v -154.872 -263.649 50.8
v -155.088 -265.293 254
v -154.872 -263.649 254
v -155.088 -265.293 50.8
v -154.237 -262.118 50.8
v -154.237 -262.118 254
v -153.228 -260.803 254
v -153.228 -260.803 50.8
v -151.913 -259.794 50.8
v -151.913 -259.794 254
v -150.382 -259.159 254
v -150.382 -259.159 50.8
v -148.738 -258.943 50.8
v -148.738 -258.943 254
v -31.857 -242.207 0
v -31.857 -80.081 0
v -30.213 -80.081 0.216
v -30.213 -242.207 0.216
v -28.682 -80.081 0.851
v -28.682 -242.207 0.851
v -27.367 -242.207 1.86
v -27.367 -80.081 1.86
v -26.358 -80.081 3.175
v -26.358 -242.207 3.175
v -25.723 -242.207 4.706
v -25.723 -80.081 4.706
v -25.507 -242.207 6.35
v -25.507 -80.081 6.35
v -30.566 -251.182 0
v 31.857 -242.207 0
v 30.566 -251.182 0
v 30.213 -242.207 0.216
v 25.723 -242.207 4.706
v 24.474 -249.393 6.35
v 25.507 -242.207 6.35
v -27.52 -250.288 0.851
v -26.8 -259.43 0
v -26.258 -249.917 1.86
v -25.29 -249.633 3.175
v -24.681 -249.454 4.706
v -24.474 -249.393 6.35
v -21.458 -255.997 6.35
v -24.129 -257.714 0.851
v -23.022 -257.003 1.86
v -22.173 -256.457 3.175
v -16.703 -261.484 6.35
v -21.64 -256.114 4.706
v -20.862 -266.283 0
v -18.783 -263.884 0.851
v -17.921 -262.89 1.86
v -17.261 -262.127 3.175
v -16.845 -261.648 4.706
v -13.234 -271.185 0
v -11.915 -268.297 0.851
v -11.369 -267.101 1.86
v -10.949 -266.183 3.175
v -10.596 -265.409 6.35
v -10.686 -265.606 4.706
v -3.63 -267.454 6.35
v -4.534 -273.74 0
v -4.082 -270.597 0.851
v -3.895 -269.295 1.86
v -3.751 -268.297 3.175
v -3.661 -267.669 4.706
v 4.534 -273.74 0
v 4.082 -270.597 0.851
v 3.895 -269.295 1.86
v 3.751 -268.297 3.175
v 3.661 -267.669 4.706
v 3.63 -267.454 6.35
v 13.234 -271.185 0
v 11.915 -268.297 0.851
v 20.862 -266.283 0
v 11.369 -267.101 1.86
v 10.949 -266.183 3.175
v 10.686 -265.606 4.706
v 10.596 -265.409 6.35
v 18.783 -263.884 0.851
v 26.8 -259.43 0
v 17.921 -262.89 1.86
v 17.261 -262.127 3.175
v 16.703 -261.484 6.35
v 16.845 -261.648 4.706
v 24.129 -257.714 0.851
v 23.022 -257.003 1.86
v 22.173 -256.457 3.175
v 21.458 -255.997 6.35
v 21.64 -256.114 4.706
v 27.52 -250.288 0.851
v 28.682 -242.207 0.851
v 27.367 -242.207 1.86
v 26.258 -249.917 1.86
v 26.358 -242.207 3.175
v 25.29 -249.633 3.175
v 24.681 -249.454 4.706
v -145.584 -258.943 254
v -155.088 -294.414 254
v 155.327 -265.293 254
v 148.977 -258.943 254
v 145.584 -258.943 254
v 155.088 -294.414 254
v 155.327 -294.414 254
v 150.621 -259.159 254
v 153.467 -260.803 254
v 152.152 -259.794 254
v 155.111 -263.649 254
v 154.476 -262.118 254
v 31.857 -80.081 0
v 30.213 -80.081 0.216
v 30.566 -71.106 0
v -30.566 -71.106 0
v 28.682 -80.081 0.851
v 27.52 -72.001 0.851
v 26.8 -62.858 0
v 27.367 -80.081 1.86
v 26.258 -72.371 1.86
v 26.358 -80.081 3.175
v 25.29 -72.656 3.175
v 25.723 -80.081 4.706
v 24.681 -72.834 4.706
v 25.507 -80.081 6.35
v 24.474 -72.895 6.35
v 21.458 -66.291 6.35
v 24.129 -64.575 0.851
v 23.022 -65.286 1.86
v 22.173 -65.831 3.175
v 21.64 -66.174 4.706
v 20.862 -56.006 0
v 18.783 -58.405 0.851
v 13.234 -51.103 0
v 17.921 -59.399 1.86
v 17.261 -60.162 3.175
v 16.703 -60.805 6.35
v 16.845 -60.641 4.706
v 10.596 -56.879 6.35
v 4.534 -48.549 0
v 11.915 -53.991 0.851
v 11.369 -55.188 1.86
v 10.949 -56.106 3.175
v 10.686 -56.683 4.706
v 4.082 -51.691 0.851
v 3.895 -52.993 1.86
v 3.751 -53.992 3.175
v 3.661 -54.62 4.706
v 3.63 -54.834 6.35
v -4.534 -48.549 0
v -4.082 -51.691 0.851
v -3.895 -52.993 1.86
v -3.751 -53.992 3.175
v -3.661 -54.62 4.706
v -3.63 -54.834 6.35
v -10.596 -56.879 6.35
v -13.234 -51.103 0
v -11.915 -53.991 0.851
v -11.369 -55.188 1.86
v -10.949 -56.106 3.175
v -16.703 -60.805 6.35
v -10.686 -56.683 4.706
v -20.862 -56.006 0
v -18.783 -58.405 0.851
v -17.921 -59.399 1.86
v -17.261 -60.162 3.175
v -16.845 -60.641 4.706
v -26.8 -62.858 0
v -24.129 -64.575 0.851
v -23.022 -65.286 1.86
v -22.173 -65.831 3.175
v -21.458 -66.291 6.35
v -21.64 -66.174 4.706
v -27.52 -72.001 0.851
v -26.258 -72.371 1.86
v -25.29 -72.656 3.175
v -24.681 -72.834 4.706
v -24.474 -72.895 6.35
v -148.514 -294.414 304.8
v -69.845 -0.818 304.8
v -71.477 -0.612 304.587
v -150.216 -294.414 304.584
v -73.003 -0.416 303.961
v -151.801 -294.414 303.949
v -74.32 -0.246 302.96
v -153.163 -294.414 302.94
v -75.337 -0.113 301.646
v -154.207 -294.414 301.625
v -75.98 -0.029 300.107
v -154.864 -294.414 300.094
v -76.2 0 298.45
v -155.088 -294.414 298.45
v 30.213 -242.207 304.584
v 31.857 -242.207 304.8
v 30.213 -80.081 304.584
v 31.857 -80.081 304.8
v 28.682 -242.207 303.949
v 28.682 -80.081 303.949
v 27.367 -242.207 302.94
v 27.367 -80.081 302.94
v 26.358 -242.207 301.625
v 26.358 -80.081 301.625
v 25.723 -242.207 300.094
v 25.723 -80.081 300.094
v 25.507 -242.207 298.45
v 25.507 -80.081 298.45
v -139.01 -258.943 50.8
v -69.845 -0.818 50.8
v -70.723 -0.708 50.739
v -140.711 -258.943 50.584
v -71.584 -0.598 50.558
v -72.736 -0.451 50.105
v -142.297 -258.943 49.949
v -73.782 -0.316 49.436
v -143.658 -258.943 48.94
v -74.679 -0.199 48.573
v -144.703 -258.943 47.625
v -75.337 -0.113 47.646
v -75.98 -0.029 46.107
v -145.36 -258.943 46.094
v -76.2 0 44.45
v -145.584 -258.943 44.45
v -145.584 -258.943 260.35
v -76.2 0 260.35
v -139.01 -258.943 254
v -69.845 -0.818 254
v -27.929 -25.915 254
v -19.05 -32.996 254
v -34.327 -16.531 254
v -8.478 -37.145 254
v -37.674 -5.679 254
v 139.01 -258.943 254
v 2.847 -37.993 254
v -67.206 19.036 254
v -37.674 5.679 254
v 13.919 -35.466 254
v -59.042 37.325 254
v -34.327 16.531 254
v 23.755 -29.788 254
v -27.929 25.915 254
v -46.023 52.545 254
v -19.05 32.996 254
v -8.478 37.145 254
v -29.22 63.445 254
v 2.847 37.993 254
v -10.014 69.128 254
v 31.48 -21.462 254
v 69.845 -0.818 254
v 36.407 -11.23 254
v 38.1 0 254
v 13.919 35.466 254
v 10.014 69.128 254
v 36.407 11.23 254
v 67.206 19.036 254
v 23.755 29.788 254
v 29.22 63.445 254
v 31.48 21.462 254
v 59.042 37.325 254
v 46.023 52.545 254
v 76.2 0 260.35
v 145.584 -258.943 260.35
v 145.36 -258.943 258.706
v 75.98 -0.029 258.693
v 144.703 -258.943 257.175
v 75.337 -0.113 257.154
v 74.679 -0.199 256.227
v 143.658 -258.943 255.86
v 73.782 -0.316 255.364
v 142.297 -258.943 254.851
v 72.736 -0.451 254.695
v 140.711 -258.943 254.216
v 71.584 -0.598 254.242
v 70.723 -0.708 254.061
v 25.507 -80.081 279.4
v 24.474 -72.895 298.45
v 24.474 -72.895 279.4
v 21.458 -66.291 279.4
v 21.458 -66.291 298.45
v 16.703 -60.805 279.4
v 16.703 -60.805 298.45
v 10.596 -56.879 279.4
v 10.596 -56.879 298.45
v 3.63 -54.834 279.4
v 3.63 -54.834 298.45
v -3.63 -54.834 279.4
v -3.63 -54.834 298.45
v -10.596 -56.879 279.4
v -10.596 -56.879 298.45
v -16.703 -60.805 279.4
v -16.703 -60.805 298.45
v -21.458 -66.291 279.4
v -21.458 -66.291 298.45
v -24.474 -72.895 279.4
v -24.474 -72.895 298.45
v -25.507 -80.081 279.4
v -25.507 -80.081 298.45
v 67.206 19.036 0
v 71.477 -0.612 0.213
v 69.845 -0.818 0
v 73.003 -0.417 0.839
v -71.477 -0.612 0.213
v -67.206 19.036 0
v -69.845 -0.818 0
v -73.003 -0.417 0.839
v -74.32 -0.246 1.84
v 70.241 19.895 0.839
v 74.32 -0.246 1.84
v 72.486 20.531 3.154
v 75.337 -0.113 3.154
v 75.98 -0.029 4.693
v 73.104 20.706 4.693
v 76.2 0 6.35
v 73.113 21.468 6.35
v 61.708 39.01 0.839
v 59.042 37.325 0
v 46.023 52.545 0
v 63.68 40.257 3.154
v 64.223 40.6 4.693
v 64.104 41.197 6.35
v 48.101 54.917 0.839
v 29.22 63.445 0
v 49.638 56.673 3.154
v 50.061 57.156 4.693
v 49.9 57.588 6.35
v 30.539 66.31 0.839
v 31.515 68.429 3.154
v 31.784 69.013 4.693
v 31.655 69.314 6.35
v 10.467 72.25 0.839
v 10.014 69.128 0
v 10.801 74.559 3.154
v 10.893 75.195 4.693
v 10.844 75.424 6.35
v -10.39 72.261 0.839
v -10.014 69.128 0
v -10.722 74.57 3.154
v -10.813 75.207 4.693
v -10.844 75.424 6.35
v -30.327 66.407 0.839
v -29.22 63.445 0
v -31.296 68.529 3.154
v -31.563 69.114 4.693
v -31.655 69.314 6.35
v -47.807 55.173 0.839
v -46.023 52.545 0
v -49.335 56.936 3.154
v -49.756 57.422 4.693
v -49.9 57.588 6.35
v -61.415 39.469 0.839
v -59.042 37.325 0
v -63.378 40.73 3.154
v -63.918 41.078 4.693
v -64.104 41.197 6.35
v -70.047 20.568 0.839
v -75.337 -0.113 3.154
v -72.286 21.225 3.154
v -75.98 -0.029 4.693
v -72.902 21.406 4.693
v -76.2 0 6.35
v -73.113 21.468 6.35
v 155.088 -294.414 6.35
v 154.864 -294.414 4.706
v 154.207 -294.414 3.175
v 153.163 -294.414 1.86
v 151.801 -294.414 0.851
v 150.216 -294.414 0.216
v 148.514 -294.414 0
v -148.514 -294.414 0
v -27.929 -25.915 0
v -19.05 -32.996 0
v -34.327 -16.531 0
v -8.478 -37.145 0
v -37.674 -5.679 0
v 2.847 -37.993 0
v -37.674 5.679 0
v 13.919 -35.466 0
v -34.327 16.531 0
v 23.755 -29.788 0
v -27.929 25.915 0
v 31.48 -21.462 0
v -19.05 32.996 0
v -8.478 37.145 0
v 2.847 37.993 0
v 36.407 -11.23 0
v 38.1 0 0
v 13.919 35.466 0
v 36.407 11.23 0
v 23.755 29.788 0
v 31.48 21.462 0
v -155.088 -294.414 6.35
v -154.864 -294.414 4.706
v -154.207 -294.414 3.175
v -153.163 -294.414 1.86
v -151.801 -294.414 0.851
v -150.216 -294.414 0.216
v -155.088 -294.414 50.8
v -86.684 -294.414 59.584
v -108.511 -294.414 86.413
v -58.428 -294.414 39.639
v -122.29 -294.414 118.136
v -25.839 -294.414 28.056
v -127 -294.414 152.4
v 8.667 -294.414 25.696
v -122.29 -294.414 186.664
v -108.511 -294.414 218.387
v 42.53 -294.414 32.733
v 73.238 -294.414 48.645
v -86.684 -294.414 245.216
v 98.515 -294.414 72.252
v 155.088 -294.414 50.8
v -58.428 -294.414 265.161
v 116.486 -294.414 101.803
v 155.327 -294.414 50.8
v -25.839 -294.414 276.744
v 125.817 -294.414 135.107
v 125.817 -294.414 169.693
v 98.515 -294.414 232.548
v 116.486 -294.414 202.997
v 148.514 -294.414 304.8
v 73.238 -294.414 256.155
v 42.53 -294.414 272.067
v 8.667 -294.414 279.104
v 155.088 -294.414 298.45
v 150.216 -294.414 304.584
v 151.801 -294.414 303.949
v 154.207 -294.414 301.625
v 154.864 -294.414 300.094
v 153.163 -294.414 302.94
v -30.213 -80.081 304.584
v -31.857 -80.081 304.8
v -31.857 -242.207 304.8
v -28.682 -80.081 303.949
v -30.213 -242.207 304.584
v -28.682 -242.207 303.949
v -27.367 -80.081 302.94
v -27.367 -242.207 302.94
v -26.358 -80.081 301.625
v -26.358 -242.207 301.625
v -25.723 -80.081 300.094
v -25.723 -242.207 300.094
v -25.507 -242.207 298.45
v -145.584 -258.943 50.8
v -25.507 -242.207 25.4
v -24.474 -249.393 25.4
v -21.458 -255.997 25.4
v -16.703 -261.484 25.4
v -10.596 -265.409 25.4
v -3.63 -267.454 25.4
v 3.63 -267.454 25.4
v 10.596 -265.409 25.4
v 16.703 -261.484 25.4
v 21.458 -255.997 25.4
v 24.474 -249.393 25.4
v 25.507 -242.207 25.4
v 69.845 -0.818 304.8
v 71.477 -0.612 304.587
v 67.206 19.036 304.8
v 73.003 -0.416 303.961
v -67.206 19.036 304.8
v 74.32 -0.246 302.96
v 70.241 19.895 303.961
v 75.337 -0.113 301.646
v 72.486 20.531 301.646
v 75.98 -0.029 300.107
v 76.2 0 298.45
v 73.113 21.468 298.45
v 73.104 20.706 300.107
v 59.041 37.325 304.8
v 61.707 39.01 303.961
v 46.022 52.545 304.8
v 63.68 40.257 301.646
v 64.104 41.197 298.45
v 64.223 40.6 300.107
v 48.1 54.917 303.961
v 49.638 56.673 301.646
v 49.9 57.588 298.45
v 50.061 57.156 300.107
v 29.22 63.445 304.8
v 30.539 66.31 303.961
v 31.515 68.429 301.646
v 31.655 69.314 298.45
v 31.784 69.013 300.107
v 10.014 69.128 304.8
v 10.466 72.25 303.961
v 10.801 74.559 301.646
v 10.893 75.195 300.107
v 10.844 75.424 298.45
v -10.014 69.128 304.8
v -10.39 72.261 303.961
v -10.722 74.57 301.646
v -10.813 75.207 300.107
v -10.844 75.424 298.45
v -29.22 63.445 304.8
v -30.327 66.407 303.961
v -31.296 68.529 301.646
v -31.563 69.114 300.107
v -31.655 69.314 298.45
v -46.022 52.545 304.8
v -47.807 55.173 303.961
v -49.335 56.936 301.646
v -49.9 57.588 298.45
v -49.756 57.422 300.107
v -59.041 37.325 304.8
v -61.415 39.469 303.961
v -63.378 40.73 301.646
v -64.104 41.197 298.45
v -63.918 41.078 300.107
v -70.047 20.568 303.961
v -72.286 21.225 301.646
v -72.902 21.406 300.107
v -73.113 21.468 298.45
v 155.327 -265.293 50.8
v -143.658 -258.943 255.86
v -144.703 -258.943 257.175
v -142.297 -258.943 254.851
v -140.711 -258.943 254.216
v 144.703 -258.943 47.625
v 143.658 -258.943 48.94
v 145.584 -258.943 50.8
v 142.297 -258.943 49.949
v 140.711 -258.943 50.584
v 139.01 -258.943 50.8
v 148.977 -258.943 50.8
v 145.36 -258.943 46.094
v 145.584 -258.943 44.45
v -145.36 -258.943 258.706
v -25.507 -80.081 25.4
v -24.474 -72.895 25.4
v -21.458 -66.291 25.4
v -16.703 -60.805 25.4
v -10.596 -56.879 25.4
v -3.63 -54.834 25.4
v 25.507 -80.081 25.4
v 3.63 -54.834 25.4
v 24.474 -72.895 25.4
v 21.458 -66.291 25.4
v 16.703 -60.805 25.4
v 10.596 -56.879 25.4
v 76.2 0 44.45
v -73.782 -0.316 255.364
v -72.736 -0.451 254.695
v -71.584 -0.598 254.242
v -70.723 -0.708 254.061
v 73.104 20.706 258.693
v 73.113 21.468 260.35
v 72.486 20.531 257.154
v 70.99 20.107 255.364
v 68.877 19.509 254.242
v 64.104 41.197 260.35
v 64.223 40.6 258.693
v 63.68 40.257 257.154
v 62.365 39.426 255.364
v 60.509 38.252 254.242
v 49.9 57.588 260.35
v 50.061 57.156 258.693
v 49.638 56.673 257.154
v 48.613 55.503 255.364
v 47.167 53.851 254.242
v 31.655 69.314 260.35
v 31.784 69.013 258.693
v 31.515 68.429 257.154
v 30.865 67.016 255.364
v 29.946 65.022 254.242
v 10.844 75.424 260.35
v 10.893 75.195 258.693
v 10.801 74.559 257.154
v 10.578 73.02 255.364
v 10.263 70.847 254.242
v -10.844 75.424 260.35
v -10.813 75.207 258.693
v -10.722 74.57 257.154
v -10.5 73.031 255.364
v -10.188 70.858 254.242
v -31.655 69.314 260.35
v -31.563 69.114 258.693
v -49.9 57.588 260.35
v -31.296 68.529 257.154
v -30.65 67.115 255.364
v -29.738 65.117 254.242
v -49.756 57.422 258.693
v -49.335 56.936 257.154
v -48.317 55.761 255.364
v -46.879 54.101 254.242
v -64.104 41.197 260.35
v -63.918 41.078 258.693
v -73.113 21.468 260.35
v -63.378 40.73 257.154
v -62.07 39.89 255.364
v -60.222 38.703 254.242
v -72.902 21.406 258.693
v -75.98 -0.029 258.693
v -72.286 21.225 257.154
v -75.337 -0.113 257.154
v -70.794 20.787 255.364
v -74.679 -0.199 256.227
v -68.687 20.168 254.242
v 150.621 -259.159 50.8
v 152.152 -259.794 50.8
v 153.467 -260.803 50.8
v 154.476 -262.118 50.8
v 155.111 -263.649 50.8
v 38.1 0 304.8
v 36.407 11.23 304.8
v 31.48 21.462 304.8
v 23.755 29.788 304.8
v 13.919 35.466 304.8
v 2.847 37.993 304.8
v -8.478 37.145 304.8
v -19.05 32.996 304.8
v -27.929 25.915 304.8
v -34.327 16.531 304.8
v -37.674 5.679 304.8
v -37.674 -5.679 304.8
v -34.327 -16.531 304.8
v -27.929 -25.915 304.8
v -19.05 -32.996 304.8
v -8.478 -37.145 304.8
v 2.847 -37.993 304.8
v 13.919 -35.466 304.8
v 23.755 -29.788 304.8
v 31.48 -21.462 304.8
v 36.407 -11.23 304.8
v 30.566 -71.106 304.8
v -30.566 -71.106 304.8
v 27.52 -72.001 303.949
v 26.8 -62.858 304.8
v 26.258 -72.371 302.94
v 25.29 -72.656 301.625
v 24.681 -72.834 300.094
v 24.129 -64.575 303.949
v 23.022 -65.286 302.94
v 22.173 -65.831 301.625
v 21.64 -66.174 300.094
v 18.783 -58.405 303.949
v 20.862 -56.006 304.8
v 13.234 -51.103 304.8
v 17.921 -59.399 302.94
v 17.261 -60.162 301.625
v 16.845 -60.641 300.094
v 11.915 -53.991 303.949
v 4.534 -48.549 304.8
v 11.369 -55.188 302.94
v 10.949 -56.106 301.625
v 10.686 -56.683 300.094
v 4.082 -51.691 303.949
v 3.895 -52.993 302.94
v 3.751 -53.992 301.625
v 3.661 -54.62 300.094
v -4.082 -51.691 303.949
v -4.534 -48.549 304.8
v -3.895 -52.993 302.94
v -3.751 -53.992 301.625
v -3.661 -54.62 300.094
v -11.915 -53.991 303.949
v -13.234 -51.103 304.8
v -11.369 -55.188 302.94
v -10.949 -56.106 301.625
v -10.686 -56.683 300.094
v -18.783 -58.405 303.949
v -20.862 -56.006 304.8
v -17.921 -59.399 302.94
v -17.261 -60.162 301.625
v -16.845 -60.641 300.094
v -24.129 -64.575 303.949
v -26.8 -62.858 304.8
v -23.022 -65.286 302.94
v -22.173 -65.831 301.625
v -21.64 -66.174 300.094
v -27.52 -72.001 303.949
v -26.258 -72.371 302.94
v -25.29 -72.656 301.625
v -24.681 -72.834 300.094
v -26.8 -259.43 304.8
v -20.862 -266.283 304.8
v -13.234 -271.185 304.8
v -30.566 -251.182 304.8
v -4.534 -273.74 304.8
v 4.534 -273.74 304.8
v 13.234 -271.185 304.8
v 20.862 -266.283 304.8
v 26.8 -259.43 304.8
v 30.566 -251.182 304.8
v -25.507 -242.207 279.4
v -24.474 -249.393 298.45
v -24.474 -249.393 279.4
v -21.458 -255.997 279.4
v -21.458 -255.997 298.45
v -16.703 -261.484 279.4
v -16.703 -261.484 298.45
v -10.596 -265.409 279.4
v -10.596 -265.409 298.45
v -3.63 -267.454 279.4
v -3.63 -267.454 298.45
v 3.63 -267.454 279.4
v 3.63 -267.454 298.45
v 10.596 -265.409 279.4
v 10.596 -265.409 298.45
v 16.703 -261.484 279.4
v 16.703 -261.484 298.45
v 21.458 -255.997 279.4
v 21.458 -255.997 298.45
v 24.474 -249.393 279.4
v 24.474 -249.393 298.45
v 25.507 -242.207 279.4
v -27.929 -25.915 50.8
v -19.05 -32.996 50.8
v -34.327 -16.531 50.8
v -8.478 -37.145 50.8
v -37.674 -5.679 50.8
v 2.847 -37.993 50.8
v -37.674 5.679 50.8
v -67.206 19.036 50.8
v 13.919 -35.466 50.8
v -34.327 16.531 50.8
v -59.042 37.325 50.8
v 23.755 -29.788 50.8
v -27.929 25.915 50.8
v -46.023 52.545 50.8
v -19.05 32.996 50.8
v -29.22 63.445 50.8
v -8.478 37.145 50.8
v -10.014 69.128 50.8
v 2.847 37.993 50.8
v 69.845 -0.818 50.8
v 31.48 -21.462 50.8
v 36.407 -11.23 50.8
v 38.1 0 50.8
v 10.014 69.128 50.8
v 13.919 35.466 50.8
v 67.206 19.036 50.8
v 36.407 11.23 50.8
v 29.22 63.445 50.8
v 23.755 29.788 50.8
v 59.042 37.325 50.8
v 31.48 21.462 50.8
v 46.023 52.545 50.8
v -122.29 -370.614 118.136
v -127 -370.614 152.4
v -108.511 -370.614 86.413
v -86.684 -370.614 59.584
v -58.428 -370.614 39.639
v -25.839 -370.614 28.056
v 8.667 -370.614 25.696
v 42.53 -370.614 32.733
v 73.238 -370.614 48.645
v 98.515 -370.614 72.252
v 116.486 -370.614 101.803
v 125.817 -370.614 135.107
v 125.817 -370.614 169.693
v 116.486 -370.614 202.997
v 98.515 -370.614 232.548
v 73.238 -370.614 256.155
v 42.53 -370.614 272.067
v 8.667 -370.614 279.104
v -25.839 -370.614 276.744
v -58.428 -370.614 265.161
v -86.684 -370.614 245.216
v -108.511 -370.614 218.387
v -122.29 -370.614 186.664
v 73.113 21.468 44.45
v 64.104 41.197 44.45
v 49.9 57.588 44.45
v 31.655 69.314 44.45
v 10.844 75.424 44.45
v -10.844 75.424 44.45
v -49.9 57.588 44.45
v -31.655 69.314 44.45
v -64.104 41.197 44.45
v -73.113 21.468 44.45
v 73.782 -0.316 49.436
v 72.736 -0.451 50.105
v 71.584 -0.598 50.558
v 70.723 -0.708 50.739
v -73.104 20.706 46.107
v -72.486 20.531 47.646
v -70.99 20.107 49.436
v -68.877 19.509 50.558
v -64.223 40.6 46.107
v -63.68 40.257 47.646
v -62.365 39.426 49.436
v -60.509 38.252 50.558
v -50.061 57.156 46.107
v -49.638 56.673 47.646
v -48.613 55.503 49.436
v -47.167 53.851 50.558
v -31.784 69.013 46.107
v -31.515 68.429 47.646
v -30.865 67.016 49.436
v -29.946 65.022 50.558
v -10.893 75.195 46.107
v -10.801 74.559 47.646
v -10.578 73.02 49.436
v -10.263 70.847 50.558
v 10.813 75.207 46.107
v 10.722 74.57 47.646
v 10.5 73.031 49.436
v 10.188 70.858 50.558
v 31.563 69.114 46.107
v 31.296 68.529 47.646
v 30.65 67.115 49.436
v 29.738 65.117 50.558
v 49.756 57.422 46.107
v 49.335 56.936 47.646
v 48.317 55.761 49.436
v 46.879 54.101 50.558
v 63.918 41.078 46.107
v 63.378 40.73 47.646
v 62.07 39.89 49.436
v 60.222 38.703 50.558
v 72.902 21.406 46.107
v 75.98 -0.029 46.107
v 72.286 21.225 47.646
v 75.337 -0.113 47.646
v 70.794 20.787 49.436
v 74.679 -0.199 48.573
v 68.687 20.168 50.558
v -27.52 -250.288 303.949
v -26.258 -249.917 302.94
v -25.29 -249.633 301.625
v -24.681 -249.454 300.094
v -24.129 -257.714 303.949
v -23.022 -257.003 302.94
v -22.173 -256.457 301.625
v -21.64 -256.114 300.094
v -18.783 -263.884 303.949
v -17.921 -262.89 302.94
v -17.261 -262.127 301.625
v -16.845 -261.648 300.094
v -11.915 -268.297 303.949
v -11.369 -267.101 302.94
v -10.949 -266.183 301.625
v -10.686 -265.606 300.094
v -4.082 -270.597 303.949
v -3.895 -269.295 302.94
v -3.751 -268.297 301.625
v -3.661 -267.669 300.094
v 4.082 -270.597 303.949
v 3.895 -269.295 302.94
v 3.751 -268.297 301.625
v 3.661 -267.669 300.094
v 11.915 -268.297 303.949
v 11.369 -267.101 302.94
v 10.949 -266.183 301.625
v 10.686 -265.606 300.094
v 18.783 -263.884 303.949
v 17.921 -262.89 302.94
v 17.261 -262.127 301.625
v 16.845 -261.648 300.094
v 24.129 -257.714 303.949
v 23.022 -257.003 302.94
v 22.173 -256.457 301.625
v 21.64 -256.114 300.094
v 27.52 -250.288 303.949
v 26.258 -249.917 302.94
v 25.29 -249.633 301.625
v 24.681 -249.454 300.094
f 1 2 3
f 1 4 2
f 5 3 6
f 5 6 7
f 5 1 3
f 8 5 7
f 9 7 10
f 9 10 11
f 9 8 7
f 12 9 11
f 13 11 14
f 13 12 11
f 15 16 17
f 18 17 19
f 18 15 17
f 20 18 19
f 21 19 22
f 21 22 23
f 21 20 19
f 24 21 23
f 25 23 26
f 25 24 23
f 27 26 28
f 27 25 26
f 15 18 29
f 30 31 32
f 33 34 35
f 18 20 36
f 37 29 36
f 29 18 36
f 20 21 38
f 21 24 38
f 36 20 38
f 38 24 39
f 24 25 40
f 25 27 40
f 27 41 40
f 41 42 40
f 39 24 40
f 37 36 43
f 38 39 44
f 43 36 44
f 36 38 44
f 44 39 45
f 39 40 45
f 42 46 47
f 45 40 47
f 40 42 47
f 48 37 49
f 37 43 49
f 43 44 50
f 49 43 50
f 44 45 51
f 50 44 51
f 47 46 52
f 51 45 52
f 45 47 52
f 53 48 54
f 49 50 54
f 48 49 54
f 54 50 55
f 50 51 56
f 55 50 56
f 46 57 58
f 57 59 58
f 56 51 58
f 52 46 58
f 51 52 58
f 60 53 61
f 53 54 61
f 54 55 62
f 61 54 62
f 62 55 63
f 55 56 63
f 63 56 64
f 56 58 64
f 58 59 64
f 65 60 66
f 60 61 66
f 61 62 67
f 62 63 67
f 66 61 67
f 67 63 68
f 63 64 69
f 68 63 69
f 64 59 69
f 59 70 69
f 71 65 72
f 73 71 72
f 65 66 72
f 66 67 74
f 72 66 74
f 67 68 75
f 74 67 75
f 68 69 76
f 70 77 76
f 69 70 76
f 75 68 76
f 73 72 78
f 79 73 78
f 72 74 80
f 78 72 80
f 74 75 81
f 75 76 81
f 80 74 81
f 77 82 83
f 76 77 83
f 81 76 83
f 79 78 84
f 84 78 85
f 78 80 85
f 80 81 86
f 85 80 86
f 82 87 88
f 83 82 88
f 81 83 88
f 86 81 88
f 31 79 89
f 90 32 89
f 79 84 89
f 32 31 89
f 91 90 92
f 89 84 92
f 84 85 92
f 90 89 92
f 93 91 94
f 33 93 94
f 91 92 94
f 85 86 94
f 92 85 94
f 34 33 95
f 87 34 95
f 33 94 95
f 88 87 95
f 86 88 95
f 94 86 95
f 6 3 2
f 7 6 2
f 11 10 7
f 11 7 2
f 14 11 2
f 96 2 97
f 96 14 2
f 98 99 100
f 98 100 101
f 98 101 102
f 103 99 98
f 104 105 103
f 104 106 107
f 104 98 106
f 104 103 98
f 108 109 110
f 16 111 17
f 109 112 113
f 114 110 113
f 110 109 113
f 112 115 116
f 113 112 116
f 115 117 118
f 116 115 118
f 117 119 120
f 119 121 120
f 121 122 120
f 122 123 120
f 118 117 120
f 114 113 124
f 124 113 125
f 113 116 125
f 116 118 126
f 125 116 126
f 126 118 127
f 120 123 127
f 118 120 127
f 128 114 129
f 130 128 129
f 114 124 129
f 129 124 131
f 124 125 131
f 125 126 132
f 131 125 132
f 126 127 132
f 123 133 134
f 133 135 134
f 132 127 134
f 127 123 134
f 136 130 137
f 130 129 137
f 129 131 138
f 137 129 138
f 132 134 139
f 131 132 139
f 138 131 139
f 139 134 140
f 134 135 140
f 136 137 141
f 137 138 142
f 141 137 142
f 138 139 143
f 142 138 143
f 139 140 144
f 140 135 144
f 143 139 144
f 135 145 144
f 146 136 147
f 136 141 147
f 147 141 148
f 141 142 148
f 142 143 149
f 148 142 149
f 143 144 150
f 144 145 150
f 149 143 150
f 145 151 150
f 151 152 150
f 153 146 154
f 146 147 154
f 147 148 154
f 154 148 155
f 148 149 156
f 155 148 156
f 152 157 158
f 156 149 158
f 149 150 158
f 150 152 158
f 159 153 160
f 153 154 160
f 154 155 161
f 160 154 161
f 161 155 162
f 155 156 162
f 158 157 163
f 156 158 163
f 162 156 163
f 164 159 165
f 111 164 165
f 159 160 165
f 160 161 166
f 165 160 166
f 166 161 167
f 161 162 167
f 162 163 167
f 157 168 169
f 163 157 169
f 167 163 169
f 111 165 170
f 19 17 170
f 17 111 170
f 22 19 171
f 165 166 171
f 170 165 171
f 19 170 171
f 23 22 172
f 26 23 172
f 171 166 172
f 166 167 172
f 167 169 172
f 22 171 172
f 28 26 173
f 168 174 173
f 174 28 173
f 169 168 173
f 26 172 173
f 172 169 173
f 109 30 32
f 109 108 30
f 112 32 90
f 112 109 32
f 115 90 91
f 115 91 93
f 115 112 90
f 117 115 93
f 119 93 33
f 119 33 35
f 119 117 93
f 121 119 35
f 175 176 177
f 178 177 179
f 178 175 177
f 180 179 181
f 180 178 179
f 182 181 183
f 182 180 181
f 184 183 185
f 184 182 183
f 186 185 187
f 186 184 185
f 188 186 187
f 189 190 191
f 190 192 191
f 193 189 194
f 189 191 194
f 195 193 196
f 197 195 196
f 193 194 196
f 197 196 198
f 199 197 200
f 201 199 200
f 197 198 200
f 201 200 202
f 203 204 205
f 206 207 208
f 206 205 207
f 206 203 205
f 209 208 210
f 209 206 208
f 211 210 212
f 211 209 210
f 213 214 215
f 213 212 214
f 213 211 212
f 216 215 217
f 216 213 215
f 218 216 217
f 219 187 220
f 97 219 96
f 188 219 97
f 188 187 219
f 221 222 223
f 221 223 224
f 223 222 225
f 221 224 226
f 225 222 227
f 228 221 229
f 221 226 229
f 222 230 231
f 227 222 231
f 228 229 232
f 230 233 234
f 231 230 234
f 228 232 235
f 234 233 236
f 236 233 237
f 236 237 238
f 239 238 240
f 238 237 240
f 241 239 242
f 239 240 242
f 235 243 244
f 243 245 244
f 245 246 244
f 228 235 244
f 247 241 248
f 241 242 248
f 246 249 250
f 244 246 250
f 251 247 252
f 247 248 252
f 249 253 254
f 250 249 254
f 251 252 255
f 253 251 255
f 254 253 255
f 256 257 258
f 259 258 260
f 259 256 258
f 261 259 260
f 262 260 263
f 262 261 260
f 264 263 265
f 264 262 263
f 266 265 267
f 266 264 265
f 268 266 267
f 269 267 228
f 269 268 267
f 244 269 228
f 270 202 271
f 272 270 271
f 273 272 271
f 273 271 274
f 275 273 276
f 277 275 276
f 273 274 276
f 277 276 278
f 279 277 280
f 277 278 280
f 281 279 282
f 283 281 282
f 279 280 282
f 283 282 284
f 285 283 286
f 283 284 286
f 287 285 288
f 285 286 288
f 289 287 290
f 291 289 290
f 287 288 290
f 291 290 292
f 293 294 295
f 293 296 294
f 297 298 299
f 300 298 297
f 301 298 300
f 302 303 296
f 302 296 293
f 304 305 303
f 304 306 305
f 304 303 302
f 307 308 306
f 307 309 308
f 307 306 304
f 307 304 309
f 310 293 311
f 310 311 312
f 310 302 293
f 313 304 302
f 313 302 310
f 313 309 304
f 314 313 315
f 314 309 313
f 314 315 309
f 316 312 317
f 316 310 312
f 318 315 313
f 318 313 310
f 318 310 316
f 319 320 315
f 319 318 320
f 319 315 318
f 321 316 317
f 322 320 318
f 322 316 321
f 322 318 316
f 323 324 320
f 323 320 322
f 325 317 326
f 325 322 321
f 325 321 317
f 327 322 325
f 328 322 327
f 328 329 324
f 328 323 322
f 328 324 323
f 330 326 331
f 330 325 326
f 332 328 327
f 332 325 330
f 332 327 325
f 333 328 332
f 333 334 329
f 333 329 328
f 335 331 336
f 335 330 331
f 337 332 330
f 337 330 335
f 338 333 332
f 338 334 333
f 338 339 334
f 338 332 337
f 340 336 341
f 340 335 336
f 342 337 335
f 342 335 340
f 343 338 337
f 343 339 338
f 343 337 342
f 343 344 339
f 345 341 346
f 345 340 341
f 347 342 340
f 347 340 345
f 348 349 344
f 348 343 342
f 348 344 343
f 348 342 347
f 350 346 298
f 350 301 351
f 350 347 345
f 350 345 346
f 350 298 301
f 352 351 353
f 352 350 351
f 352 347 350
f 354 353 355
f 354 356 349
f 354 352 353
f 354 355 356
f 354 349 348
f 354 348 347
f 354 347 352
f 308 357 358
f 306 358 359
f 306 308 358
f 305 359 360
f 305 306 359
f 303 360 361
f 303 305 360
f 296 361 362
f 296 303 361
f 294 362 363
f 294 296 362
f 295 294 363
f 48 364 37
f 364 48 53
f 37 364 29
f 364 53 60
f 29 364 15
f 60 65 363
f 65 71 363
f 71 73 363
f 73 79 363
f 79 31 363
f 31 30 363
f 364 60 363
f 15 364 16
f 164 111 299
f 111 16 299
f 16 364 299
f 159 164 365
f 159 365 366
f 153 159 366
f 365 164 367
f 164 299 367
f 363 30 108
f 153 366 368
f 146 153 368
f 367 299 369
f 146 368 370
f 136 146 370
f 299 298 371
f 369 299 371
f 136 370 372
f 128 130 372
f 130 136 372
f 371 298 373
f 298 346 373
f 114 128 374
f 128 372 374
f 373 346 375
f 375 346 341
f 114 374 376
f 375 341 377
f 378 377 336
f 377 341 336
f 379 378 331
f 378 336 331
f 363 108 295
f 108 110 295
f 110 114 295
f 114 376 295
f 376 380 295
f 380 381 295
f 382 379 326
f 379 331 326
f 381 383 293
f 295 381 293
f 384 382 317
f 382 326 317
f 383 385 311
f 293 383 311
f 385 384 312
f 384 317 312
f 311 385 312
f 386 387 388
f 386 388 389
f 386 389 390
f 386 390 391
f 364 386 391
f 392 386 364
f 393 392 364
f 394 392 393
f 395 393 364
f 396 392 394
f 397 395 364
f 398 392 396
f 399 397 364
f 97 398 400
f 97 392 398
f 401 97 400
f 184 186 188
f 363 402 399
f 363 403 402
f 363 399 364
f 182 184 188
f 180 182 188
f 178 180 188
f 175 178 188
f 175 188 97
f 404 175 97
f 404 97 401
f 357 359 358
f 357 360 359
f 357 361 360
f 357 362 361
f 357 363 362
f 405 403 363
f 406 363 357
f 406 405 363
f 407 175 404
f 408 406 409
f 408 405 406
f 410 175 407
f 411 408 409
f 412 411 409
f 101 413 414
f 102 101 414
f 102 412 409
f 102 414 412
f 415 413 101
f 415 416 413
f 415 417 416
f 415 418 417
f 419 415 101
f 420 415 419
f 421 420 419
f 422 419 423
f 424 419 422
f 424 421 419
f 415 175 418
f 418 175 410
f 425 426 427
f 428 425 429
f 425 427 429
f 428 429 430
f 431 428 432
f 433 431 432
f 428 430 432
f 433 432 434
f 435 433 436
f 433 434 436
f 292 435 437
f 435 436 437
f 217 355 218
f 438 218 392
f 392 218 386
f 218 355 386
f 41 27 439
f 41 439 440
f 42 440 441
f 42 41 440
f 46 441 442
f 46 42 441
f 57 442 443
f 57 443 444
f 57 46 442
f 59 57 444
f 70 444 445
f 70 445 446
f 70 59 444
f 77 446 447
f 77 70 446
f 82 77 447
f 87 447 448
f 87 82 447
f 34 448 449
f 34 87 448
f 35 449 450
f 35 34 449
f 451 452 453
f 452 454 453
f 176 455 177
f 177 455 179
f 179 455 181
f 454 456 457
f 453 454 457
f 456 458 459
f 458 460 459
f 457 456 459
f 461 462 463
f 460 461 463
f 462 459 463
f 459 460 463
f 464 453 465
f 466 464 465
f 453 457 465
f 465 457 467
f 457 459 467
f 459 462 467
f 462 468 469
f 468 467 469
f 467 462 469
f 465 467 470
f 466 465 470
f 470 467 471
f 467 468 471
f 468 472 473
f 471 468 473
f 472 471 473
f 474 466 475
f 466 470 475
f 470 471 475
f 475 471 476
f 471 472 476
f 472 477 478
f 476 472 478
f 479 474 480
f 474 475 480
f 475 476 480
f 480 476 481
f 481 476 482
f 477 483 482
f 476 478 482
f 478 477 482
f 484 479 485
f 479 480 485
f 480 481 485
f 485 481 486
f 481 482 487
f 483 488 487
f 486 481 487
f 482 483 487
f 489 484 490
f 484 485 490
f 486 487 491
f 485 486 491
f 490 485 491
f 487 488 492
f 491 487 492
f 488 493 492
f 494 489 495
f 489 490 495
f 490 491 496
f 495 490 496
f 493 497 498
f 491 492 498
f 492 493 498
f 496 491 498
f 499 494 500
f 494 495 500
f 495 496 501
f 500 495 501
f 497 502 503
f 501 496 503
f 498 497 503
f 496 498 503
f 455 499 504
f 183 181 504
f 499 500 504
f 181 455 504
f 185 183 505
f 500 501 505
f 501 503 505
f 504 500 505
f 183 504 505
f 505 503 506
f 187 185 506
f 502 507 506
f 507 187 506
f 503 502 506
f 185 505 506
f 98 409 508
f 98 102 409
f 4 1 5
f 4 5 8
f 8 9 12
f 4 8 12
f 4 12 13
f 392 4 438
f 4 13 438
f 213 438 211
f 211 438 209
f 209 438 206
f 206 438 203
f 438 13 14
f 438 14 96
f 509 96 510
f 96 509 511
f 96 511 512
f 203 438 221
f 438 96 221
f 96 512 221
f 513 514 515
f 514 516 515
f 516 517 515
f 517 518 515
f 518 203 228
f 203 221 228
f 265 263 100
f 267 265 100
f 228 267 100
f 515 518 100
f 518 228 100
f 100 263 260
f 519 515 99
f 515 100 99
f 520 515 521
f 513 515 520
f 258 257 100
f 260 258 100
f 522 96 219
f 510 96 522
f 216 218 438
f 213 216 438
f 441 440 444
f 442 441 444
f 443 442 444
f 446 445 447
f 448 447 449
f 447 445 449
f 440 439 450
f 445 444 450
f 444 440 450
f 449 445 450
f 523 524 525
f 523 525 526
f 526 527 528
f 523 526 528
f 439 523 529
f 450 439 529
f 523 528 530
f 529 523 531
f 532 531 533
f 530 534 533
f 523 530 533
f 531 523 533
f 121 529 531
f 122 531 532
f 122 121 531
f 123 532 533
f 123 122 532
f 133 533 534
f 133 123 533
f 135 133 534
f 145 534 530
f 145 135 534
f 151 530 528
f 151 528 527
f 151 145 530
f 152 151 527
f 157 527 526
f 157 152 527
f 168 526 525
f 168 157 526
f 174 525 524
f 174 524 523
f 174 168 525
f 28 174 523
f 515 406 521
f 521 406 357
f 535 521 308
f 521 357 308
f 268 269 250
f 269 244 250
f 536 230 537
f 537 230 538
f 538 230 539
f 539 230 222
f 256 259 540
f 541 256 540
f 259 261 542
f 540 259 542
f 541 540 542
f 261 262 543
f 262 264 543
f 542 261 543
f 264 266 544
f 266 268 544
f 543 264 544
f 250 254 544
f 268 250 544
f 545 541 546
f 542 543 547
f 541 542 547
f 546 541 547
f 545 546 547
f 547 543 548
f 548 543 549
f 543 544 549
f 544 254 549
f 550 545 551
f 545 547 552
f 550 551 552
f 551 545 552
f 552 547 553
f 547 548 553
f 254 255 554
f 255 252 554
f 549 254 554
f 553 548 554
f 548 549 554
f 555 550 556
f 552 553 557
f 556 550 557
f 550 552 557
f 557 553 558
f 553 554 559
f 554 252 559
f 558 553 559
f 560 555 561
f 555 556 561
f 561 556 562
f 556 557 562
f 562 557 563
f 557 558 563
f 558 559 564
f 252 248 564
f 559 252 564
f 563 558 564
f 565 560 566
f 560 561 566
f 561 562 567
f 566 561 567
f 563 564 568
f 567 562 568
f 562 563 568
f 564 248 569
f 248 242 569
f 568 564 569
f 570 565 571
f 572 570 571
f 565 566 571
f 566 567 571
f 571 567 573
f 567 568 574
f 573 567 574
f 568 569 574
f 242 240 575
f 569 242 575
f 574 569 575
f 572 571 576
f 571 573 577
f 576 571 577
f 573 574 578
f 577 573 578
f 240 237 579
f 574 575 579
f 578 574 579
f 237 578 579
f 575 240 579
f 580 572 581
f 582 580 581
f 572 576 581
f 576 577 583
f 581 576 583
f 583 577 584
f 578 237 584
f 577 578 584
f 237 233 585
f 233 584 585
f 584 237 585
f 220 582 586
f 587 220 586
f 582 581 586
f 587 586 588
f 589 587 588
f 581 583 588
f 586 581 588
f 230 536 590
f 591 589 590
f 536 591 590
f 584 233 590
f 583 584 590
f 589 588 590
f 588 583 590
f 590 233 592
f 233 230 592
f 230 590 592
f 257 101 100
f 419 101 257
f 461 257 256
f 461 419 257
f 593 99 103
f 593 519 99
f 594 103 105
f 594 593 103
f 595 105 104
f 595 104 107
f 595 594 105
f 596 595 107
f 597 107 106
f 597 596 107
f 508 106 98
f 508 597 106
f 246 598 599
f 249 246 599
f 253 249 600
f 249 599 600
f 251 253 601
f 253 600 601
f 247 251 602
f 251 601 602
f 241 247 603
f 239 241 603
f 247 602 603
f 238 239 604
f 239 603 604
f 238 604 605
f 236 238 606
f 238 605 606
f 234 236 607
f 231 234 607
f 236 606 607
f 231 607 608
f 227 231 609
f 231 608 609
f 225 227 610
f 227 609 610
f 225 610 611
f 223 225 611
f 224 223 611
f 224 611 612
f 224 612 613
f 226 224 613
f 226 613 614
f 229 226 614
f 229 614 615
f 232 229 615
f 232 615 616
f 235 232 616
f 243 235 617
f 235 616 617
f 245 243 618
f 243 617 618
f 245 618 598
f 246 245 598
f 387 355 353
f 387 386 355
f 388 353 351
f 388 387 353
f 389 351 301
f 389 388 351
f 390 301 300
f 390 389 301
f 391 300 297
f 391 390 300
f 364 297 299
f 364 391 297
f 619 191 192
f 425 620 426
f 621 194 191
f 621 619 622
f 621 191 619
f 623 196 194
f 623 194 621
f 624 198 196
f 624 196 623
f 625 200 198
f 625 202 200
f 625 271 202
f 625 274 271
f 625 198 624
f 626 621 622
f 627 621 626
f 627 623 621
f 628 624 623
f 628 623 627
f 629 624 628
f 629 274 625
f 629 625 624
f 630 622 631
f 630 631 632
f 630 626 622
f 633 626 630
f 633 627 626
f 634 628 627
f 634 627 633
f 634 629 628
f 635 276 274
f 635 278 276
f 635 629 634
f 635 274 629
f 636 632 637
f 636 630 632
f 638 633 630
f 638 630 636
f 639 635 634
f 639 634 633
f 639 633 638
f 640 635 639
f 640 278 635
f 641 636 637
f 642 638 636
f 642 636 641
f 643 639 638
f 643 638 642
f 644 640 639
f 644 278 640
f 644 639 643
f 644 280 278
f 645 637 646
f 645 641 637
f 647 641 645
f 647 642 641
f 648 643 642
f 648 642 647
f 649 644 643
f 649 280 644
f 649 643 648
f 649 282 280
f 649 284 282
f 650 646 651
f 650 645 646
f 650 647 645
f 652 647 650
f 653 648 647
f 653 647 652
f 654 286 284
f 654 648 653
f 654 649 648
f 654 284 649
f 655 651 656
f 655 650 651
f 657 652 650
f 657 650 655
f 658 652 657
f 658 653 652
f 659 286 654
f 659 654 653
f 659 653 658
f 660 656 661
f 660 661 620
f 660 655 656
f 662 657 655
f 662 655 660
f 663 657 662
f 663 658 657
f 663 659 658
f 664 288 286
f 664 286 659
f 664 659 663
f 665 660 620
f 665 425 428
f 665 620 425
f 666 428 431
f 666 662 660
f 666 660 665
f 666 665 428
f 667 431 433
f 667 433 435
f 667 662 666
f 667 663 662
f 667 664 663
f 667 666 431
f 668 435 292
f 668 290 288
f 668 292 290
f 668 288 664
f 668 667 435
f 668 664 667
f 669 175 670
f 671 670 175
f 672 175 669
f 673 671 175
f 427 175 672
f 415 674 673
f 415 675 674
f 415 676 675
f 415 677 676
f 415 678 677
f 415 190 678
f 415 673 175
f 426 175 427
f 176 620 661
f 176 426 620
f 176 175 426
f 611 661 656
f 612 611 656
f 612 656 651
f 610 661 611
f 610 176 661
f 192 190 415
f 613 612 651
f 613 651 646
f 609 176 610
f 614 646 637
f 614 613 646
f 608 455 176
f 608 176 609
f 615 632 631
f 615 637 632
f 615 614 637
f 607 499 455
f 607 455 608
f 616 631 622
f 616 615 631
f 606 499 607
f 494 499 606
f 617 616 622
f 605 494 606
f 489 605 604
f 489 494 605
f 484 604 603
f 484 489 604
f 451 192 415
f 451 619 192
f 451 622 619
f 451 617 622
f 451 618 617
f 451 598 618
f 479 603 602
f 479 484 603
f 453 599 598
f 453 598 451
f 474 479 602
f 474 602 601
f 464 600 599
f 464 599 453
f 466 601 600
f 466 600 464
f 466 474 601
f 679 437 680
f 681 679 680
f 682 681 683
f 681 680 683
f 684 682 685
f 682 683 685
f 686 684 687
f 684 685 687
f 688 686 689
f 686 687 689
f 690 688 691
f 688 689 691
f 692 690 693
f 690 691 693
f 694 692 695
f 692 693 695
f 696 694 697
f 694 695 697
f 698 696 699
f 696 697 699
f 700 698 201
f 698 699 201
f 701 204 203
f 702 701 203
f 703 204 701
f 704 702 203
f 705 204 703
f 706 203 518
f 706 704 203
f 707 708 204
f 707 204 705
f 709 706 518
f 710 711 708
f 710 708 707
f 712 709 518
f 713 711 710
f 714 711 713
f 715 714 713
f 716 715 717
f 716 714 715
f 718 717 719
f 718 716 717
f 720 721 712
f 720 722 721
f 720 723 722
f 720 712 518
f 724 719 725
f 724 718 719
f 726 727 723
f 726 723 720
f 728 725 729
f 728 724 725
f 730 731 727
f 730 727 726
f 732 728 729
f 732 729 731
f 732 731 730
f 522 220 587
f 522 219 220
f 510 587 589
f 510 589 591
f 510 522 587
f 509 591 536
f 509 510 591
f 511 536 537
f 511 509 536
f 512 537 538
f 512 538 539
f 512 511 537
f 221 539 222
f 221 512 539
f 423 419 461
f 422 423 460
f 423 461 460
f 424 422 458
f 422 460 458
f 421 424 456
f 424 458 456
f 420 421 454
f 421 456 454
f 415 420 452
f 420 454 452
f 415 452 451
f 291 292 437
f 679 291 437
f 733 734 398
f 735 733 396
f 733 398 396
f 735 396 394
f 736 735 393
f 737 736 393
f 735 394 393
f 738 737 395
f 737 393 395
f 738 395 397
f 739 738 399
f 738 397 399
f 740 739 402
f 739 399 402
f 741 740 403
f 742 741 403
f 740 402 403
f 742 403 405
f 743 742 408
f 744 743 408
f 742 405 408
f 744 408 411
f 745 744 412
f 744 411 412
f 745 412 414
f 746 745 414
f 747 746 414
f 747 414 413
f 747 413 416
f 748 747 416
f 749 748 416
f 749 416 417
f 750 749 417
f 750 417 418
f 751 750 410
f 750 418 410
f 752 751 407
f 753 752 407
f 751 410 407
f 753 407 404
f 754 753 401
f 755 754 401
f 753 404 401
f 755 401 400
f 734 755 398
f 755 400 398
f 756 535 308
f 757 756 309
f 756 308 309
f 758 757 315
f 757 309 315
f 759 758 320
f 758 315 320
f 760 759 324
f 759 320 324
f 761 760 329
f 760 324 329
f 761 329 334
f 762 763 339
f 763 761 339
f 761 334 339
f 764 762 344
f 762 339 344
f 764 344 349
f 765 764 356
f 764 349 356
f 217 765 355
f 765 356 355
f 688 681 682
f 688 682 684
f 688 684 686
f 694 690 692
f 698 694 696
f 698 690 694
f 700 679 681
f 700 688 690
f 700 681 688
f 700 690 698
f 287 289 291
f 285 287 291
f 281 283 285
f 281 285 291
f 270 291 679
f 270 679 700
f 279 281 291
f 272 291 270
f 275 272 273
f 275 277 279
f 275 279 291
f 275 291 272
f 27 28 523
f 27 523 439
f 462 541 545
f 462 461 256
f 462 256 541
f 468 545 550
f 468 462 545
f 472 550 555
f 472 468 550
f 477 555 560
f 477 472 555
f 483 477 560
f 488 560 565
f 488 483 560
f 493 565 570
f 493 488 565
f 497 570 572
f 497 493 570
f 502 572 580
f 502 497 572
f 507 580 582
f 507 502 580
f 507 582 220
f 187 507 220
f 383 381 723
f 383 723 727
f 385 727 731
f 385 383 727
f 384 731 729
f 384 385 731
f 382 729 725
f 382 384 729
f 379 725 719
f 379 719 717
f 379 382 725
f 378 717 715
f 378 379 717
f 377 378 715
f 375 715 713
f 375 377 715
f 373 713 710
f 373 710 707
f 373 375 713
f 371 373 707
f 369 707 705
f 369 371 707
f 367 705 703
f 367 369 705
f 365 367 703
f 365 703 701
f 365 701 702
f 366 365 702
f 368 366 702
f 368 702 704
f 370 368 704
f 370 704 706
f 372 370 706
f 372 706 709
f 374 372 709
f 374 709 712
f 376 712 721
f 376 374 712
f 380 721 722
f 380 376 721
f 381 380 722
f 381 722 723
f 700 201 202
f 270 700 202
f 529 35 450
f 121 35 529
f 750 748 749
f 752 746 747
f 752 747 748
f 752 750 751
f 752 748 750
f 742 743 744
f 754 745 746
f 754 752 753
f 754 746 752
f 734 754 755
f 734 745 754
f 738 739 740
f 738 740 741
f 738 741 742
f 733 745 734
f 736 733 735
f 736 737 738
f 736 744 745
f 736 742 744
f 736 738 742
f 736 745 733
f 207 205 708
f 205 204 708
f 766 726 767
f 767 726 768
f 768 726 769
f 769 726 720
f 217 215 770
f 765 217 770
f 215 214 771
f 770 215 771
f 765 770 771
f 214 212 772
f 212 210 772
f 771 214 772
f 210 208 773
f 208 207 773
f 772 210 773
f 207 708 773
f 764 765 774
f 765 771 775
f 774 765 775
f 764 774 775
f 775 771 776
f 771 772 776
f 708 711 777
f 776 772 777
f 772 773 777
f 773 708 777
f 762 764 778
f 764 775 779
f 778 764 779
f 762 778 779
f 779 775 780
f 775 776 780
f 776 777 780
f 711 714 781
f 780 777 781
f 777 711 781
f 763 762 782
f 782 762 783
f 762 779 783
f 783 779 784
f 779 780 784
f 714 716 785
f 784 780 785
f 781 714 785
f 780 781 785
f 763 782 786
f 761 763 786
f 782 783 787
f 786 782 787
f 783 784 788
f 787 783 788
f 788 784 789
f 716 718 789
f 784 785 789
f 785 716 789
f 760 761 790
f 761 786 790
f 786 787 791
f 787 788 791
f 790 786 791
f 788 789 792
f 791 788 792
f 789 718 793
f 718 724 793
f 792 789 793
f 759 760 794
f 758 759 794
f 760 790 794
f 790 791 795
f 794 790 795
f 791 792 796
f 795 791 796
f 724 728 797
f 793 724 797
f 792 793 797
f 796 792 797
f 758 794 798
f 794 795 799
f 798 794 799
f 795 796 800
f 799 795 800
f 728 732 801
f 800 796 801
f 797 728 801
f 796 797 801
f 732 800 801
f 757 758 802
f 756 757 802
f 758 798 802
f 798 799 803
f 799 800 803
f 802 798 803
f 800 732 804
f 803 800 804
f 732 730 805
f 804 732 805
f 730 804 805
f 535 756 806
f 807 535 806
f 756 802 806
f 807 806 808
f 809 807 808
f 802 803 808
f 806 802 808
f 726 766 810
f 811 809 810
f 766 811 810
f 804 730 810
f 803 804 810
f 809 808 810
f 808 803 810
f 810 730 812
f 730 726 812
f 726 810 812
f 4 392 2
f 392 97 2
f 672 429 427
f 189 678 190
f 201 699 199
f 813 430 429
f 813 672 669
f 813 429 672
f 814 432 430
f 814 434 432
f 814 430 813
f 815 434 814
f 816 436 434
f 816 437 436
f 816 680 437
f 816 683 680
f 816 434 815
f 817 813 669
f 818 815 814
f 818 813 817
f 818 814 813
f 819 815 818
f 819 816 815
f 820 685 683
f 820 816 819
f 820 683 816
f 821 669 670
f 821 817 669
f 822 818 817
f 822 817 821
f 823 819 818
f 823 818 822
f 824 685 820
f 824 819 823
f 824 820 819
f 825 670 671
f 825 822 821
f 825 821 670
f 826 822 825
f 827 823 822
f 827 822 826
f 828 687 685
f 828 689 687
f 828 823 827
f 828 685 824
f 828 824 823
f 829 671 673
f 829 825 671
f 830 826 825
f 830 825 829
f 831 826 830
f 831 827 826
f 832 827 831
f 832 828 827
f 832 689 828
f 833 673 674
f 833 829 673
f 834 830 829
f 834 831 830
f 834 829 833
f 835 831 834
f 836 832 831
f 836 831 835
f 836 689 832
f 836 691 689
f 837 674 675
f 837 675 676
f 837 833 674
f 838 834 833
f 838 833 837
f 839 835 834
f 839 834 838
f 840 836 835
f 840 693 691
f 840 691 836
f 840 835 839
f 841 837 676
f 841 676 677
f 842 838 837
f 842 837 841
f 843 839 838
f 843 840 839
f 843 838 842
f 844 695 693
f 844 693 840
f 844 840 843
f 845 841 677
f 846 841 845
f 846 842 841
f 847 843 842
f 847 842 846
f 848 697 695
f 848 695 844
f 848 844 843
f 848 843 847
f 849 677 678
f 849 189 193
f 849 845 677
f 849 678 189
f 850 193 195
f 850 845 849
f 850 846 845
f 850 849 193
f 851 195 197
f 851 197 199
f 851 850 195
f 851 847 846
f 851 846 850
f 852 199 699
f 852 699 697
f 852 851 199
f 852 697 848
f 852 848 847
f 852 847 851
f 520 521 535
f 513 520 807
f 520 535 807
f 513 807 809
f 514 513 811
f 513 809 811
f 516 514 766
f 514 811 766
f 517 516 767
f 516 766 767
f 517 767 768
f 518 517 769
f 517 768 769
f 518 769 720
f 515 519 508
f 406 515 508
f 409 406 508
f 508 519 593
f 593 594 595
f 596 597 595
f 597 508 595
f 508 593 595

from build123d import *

# Parameters (mm, degrees)
SKETCH2_R           = 38.1
BOSS_EXTRUDE2_DEPTH = 50.8
SKETCH4_W           = 310.4151135
SKETCH4_H           = 35.471388383
BOSS_EXTRUDE4_DEPTH = 101.6
CUT_EXTRUDE1_DEPTH  = 25.4
FILLET1_R           = 6.35
FILLET2_R           = 6.35
FILLET3_R           = 6.35
FILLET4_R           = 6.35
FILLET5_R           = 6.35
SKETCH8_R           = 127
BOSS_EXTRUDE5_DEPTH = 76.2


with BuildPart() as part:
    # Sketch2 → Boss-Extrude2 (new body)
    with BuildSketch(Plane.XY):
        with BuildLine():
            Line((-76.2, 0), (-155.088044947, -294.414191853))
            Line((-155.088044947, -294.414191853), (155.088044947, -294.414191853))
            Line((155.088044947, -294.414191853), (76.2, 0))
            ThreePointArc((76.2, 0), (0, 76.2), (-76.2, 0))
        make_face()
        Circle(SKETCH2_R, mode=Mode.SUBTRACT)
    extrude(amount=BOSS_EXTRUDE2_DEPTH)

    # Sketch4 → Boss-Extrude4 (add)
    with BuildSketch(Plane.XY.offset(50.8)):
        with Locations((0.119511803, -276.678497662)):
            Rectangle(SKETCH4_W, SKETCH4_H)
    extrude(amount=BOSS_EXTRUDE4_DEPTH)

    # Sketch5 → Cut-Extrude1 (cut)
    with BuildSketch(Plane(origin=(0, 0, 0), x_dir=(-1, 0, 0), z_dir=(0, 0, -1))):
        with BuildLine():
            Line((25.506839575, -80.081330591), (25.506839575, -242.20722706))
            ThreePointArc((25.506839575, -242.20722706), (0, -267.714066635), (-25.506839575, -242.20722706))
            Line((-25.506839575, -242.20722706), (-25.506839575, -80.081330591))
            ThreePointArc((-25.506839575, -80.081330591), (0, -54.574491016), (25.506839575, -80.081330591))
        make_face()
    extrude(amount=-CUT_EXTRUDE1_DEPTH, mode=Mode.SUBTRACT)

    # Mirror5: part across plane


with BuildPart() as part_1:
    add(part.part)
    add(part.part.mirror(Plane(origin=(0, 0, 152.4), x_dir=(1, 0, 0), z_dir=(0, 0, -1))))

    # Fillet1
    fillet1_edges = [part_1.edges().sort_by_distance(p)[0] for p in [
        (115.644022474, -147.207095926, 304.8),
    ]]
    fillet(fillet1_edges, radius=FILLET1_R)

    # Fillet2
    fillet2_edges = [part_1.edges().sort_by_distance(p)[0] for p in [
        (-115.644022474, -147.207095926, 304.8),
    ]]
    fillet(fillet2_edges, radius=FILLET2_R)

    # Fillet3
    fillet3_edges = [part_1.edges().sort_by_distance(p)[0] for p in [
        (0, 76.2, 304.8),
    ]]
    fillet(fillet3_edges, radius=FILLET3_R)

    # Fillet4
    fillet4_edges = [part_1.edges().sort_by_distance(p)[0] for p in [
        (0, -54.574491016, 304.8),
        (25.506839575, -161.144278825, 304.8),
        (0, -267.714066635, 304.8),
        (-25.506839575, -161.144278825, 304.8),
    ]]
    fillet(fillet4_edges, radius=FILLET4_R)

    # Fillet5
    fillet5_edges = [part_1.edges().sort_by_distance(p)[0] for p in [
        (110.891757538, -129.471401735, 254),
    ]]
    fillet(fillet5_edges, radius=FILLET5_R)
    fillet5_2_edges = [part_1.edges().sort_by_distance(p)[0] for p in [
        (-110.891757538, -129.471401735, 254),
    ]]
    fillet(fillet5_2_edges, radius=FILLET5_R)
    fillet5_3_edges = [part_1.edges().sort_by_distance(p)[0] for p in [
        (-155.088044947, -258.94280347, 152.4),
    ]]
    fillet(fillet5_3_edges, radius=FILLET5_R)
    fillet5_4_edges = [part_1.edges().sort_by_distance(p)[0] for p in [
        (-115.644022474, -147.207095926, 0),
    ]]
    fillet(fillet5_4_edges, radius=FILLET5_R)
    fillet5_5_edges = [part_1.edges().sort_by_distance(p)[0] for p in [
        (-110.891757538, -129.471401735, 50.8),
    ]]
    fillet(fillet5_5_edges, radius=FILLET5_R)
    fillet5_6_edges = [part_1.edges().sort_by_distance(p)[0] for p in [
        (155.327068553, -258.94280347, 152.4),
    ]]
    fillet(fillet5_6_edges, radius=FILLET5_R)
    fillet5_7_edges = [part_1.edges().sort_by_distance(p)[0] for p in [
        (115.644022474, -147.207095926, 0),
    ]]
    fillet(fillet5_7_edges, radius=FILLET5_R)
    fillet5_8_edges = [part_1.edges().sort_by_distance(p)[0] for p in [
        (0, -54.574491016, 0),
        (-25.506839575, -161.144278825, 0),
        (0, -267.714066635, 0),
        (25.506839575, -161.144278825, 0),
    ]]
    fillet(fillet5_8_edges, radius=FILLET5_R)
    fillet5_9_edges = [part_1.edges().sort_by_distance(p)[0] for p in [
        (110.891757538, -129.471401735, 50.8),
    ]]
    fillet(fillet5_9_edges, radius=FILLET5_R)
    fillet5_10_edges = [part_1.edges().sort_by_distance(p)[0] for p in [
        (0, 76.2, 50.8),
    ]]
    fillet(fillet5_10_edges, radius=FILLET5_R - 0.0001)  # a hair under: the kernel refuses the full size
    fillet5_11_edges = [part_1.edges().sort_by_distance(p)[0] for p in [
        (0, 76.2, 254),
    ]]
    fillet(fillet5_11_edges, radius=FILLET5_R - 0.0001)  # a hair under: the kernel refuses the full size
    fillet5_12_edges = [part_1.edges().sort_by_distance(p)[0] for p in [
        (0, 76.2, 0),
    ]]
    fillet(fillet5_12_edges, radius=FILLET5_R - 0.0001)  # a hair under: the kernel refuses the full size

    # Sketch8 → Boss-Extrude5 (add)
    with BuildSketch(Plane(origin=(0, -294.414191853, 0), x_dir=(-1, 0, 0), z_dir=(0, -1, 0))):
        with Locations((0, -152.4)):
            Circle(SKETCH8_R)
    extrude(amount=BOSS_EXTRUDE5_DEPTH)


solid = part_1.part
